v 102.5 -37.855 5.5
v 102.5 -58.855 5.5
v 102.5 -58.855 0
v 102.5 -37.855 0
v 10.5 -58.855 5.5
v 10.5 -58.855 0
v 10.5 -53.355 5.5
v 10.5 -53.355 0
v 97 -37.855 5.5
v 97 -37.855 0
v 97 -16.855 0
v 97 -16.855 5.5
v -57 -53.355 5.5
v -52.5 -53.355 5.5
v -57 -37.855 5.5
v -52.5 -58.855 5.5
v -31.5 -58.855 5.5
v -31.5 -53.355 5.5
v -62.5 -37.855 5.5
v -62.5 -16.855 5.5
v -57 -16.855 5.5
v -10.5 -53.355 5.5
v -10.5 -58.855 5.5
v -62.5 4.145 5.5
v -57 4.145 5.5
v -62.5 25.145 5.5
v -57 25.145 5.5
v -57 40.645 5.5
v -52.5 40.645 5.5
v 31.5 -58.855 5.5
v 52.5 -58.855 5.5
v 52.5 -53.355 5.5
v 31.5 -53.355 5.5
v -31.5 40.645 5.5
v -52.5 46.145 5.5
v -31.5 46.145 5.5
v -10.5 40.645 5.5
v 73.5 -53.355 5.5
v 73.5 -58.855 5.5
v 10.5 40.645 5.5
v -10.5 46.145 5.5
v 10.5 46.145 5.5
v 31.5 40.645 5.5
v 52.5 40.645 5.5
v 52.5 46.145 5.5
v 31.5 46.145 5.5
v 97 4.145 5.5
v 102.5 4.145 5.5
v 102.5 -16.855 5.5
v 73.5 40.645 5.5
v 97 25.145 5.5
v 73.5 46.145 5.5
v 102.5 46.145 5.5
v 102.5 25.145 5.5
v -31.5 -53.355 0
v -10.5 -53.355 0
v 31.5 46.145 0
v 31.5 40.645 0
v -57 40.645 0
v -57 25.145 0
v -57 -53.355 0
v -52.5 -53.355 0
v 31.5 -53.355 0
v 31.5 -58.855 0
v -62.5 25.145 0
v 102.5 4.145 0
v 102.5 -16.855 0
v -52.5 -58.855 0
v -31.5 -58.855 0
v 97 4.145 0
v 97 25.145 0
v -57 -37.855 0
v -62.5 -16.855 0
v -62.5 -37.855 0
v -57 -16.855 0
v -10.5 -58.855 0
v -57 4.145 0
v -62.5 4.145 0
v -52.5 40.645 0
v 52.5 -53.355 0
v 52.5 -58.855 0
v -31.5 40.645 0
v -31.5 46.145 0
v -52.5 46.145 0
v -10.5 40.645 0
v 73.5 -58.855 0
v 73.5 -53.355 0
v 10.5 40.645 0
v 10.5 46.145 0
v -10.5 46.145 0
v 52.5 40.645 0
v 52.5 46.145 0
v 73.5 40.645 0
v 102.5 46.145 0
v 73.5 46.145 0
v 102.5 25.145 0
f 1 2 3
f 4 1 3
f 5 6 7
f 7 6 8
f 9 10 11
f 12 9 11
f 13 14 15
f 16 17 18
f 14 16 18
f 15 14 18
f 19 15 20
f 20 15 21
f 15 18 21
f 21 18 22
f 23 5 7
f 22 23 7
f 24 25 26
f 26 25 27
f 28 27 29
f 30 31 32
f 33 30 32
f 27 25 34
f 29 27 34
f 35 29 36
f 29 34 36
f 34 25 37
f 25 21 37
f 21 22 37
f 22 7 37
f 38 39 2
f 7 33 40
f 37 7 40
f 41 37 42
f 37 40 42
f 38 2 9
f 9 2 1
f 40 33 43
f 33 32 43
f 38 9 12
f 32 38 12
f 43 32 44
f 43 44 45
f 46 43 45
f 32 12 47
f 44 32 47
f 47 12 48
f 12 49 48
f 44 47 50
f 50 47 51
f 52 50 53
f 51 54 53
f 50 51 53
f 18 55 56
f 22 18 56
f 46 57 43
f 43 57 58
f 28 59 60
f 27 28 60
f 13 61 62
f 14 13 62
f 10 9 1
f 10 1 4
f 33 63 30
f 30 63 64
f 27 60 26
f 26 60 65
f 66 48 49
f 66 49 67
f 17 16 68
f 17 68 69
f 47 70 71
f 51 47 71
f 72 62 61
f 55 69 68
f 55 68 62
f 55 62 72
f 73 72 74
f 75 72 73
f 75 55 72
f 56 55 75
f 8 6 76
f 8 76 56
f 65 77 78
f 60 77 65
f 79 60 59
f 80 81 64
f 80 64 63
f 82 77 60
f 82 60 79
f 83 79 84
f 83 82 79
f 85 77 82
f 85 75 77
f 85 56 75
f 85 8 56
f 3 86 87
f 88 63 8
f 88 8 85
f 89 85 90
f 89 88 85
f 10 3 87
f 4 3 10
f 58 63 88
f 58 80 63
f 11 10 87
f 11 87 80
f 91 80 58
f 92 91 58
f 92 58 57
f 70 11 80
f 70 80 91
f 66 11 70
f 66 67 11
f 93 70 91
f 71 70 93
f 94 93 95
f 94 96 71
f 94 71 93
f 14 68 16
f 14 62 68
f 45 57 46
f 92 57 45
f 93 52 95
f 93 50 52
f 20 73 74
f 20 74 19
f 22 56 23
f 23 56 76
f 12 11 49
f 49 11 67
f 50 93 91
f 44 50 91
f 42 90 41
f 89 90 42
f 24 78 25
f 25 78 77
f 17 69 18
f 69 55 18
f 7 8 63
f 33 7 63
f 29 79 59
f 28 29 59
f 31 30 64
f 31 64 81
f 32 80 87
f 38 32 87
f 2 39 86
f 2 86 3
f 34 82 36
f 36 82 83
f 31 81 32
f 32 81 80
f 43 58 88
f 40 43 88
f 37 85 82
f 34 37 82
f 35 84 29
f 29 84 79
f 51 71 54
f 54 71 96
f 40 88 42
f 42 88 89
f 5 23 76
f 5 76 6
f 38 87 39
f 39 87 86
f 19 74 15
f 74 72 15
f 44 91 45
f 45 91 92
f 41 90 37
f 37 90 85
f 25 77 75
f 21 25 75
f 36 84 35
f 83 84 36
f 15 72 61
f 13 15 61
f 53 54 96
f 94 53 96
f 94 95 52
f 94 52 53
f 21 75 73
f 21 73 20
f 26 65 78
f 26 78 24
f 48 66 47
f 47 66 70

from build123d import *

# Parameters (mm, degrees)
SALIENTE_EXTRUIR1_DEPTH = 5.5
CROQUIS2_W              = 26.5
CROQUIS2_H              = 5.5
CROQUIS2_W_2            = 21
SALIENTE_EXTRUIR2_DEPTH = 2.5
CROQUIS3_W              = 5.5
CROQUIS3_H              = 18.5
CROQUIS3_H_2            = 21
SALIENTE_EXTRUIR3_DEPTH = 2.5
CROQUIS4_W              = 21
CROQUIS4_H              = 5.5
CROQUIS4_W_2            = 29
SALIENTE_EXTRUIR4_DEPTH = 2.5
CROQUIS5_W              = 5.5
CROQUIS5_H              = 21
SALIENTE_EXTRUIR5_DEPTH = 2.5


with BuildPart() as part:
    # Croquis1 → Saliente-Extruir1 (new body)
    with BuildSketch(Plane.XY):
        Polygon((-57, -53.354967587), (-52.5, -53.354967587), (-52.5, -56.354967587), (-31.5, -56.354967587), (-31.5, -53.354967587), (-10.5, -53.354967587), (-10.5, -56.354967587), (10.5, -56.354967587), (10.5, -53.354967587), (31.5, -53.354967587), (31.5, -56.354967587), (52.5, -56.354967587), (52.5, -53.354967587), (73.5, -53.354967587), (73.5, -56.354967587), (94.5, -56.354967587), (100, -56.354967587), (100, -37.854967587), (97, -37.854967587), (97, -16.854967587), (100, -16.854967587), (100, 4.145032413), (97, 4.145032413), (97, 25.145032413), (100, 25.145032413), (100, 43.645032413), (73.5, 43.645032413), (73.5, 40.645032413), (52.5, 40.645032413), (52.5, 43.645032413), (31.5, 43.645032413), (31.5, 40.645032413), (10.5, 40.645032413), (10.5, 43.645032413), (-10.5, 43.645032413), (-10.5, 40.645032413), (-31.5, 40.645032413), (-31.5, 43.645032413), (-52.5, 43.645032413), (-52.5, 40.645032413), (-57, 40.645032413), (-57, 25.145032413), (-60, 25.145032413), (-60, 4.145032413), (-57, 4.145032413), (-57, -16.854967587), (-60, -16.854967587), (-60, -37.854967587), (-57, -37.854967587), align=None)
    extrude(amount=SALIENTE_EXTRUIR1_DEPTH)

    # Croquis2 → Saliente-Extruir2 (add)
    with BuildSketch(Plane(origin=(0, 43.645032413, 0), x_dir=(1, 0, 0), z_dir=(0, 1, 0))):
        with Locations((86.75, -2.75)):
            Rectangle(CROQUIS2_W, CROQUIS2_H)
        with Locations((42, -2.75)):
            Rectangle(CROQUIS2_W_2, CROQUIS2_H)
        with Locations((0, -2.75)):
            Rectangle(CROQUIS2_W_2, CROQUIS2_H)
        with Locations((-42, -2.75)):
            Rectangle(CROQUIS2_W_2, CROQUIS2_H)
    extrude(amount=SALIENTE_EXTRUIR2_DEPTH)

    # Croquis3 → Saliente-Extruir3 (add)
    with BuildSketch(Plane(origin=(100, 0, 0), x_dir=(0, 0, -1), z_dir=(1, 0, 0))):
        with Locations((-2.75, -47.104967587)):
            Rectangle(CROQUIS3_W, CROQUIS3_H)
        with Locations((-2.75, -6.354967587)):
            Rectangle(CROQUIS3_W, CROQUIS3_H_2)
        with Locations((-2.75, 35.645032413)):
            Rectangle(CROQUIS3_W, CROQUIS3_H_2)
    extrude(amount=SALIENTE_EXTRUIR3_DEPTH)

    # Croquis4 → Saliente-Extruir4 (add)
    with BuildSketch(Plane.XZ.offset(56.354967587)):
        with Locations((-42, 2.75)):
            Rectangle(CROQUIS4_W, CROQUIS4_H)
        with Locations((0, 2.75)):
            Rectangle(CROQUIS4_W, CROQUIS4_H)
        with Locations((42, 2.75)):
            Rectangle(CROQUIS4_W, CROQUIS4_H)
        with Locations((88, 2.75)):
            Rectangle(CROQUIS4_W_2, CROQUIS4_H)
    extrude(amount=SALIENTE_EXTRUIR4_DEPTH)

    # Croquis5 → Saliente-Extruir5 (add)
    with BuildSketch(Plane.ZY.offset(60)):
        with Locations((2.75, -27.354967587)):
            Rectangle(CROQUIS5_W, CROQUIS5_H)
        with Locations((2.75, 14.645032413)):
            Rectangle(CROQUIS5_W, CROQUIS5_H)
    extrude(amount=SALIENTE_EXTRUIR5_DEPTH)


solid = part.part
